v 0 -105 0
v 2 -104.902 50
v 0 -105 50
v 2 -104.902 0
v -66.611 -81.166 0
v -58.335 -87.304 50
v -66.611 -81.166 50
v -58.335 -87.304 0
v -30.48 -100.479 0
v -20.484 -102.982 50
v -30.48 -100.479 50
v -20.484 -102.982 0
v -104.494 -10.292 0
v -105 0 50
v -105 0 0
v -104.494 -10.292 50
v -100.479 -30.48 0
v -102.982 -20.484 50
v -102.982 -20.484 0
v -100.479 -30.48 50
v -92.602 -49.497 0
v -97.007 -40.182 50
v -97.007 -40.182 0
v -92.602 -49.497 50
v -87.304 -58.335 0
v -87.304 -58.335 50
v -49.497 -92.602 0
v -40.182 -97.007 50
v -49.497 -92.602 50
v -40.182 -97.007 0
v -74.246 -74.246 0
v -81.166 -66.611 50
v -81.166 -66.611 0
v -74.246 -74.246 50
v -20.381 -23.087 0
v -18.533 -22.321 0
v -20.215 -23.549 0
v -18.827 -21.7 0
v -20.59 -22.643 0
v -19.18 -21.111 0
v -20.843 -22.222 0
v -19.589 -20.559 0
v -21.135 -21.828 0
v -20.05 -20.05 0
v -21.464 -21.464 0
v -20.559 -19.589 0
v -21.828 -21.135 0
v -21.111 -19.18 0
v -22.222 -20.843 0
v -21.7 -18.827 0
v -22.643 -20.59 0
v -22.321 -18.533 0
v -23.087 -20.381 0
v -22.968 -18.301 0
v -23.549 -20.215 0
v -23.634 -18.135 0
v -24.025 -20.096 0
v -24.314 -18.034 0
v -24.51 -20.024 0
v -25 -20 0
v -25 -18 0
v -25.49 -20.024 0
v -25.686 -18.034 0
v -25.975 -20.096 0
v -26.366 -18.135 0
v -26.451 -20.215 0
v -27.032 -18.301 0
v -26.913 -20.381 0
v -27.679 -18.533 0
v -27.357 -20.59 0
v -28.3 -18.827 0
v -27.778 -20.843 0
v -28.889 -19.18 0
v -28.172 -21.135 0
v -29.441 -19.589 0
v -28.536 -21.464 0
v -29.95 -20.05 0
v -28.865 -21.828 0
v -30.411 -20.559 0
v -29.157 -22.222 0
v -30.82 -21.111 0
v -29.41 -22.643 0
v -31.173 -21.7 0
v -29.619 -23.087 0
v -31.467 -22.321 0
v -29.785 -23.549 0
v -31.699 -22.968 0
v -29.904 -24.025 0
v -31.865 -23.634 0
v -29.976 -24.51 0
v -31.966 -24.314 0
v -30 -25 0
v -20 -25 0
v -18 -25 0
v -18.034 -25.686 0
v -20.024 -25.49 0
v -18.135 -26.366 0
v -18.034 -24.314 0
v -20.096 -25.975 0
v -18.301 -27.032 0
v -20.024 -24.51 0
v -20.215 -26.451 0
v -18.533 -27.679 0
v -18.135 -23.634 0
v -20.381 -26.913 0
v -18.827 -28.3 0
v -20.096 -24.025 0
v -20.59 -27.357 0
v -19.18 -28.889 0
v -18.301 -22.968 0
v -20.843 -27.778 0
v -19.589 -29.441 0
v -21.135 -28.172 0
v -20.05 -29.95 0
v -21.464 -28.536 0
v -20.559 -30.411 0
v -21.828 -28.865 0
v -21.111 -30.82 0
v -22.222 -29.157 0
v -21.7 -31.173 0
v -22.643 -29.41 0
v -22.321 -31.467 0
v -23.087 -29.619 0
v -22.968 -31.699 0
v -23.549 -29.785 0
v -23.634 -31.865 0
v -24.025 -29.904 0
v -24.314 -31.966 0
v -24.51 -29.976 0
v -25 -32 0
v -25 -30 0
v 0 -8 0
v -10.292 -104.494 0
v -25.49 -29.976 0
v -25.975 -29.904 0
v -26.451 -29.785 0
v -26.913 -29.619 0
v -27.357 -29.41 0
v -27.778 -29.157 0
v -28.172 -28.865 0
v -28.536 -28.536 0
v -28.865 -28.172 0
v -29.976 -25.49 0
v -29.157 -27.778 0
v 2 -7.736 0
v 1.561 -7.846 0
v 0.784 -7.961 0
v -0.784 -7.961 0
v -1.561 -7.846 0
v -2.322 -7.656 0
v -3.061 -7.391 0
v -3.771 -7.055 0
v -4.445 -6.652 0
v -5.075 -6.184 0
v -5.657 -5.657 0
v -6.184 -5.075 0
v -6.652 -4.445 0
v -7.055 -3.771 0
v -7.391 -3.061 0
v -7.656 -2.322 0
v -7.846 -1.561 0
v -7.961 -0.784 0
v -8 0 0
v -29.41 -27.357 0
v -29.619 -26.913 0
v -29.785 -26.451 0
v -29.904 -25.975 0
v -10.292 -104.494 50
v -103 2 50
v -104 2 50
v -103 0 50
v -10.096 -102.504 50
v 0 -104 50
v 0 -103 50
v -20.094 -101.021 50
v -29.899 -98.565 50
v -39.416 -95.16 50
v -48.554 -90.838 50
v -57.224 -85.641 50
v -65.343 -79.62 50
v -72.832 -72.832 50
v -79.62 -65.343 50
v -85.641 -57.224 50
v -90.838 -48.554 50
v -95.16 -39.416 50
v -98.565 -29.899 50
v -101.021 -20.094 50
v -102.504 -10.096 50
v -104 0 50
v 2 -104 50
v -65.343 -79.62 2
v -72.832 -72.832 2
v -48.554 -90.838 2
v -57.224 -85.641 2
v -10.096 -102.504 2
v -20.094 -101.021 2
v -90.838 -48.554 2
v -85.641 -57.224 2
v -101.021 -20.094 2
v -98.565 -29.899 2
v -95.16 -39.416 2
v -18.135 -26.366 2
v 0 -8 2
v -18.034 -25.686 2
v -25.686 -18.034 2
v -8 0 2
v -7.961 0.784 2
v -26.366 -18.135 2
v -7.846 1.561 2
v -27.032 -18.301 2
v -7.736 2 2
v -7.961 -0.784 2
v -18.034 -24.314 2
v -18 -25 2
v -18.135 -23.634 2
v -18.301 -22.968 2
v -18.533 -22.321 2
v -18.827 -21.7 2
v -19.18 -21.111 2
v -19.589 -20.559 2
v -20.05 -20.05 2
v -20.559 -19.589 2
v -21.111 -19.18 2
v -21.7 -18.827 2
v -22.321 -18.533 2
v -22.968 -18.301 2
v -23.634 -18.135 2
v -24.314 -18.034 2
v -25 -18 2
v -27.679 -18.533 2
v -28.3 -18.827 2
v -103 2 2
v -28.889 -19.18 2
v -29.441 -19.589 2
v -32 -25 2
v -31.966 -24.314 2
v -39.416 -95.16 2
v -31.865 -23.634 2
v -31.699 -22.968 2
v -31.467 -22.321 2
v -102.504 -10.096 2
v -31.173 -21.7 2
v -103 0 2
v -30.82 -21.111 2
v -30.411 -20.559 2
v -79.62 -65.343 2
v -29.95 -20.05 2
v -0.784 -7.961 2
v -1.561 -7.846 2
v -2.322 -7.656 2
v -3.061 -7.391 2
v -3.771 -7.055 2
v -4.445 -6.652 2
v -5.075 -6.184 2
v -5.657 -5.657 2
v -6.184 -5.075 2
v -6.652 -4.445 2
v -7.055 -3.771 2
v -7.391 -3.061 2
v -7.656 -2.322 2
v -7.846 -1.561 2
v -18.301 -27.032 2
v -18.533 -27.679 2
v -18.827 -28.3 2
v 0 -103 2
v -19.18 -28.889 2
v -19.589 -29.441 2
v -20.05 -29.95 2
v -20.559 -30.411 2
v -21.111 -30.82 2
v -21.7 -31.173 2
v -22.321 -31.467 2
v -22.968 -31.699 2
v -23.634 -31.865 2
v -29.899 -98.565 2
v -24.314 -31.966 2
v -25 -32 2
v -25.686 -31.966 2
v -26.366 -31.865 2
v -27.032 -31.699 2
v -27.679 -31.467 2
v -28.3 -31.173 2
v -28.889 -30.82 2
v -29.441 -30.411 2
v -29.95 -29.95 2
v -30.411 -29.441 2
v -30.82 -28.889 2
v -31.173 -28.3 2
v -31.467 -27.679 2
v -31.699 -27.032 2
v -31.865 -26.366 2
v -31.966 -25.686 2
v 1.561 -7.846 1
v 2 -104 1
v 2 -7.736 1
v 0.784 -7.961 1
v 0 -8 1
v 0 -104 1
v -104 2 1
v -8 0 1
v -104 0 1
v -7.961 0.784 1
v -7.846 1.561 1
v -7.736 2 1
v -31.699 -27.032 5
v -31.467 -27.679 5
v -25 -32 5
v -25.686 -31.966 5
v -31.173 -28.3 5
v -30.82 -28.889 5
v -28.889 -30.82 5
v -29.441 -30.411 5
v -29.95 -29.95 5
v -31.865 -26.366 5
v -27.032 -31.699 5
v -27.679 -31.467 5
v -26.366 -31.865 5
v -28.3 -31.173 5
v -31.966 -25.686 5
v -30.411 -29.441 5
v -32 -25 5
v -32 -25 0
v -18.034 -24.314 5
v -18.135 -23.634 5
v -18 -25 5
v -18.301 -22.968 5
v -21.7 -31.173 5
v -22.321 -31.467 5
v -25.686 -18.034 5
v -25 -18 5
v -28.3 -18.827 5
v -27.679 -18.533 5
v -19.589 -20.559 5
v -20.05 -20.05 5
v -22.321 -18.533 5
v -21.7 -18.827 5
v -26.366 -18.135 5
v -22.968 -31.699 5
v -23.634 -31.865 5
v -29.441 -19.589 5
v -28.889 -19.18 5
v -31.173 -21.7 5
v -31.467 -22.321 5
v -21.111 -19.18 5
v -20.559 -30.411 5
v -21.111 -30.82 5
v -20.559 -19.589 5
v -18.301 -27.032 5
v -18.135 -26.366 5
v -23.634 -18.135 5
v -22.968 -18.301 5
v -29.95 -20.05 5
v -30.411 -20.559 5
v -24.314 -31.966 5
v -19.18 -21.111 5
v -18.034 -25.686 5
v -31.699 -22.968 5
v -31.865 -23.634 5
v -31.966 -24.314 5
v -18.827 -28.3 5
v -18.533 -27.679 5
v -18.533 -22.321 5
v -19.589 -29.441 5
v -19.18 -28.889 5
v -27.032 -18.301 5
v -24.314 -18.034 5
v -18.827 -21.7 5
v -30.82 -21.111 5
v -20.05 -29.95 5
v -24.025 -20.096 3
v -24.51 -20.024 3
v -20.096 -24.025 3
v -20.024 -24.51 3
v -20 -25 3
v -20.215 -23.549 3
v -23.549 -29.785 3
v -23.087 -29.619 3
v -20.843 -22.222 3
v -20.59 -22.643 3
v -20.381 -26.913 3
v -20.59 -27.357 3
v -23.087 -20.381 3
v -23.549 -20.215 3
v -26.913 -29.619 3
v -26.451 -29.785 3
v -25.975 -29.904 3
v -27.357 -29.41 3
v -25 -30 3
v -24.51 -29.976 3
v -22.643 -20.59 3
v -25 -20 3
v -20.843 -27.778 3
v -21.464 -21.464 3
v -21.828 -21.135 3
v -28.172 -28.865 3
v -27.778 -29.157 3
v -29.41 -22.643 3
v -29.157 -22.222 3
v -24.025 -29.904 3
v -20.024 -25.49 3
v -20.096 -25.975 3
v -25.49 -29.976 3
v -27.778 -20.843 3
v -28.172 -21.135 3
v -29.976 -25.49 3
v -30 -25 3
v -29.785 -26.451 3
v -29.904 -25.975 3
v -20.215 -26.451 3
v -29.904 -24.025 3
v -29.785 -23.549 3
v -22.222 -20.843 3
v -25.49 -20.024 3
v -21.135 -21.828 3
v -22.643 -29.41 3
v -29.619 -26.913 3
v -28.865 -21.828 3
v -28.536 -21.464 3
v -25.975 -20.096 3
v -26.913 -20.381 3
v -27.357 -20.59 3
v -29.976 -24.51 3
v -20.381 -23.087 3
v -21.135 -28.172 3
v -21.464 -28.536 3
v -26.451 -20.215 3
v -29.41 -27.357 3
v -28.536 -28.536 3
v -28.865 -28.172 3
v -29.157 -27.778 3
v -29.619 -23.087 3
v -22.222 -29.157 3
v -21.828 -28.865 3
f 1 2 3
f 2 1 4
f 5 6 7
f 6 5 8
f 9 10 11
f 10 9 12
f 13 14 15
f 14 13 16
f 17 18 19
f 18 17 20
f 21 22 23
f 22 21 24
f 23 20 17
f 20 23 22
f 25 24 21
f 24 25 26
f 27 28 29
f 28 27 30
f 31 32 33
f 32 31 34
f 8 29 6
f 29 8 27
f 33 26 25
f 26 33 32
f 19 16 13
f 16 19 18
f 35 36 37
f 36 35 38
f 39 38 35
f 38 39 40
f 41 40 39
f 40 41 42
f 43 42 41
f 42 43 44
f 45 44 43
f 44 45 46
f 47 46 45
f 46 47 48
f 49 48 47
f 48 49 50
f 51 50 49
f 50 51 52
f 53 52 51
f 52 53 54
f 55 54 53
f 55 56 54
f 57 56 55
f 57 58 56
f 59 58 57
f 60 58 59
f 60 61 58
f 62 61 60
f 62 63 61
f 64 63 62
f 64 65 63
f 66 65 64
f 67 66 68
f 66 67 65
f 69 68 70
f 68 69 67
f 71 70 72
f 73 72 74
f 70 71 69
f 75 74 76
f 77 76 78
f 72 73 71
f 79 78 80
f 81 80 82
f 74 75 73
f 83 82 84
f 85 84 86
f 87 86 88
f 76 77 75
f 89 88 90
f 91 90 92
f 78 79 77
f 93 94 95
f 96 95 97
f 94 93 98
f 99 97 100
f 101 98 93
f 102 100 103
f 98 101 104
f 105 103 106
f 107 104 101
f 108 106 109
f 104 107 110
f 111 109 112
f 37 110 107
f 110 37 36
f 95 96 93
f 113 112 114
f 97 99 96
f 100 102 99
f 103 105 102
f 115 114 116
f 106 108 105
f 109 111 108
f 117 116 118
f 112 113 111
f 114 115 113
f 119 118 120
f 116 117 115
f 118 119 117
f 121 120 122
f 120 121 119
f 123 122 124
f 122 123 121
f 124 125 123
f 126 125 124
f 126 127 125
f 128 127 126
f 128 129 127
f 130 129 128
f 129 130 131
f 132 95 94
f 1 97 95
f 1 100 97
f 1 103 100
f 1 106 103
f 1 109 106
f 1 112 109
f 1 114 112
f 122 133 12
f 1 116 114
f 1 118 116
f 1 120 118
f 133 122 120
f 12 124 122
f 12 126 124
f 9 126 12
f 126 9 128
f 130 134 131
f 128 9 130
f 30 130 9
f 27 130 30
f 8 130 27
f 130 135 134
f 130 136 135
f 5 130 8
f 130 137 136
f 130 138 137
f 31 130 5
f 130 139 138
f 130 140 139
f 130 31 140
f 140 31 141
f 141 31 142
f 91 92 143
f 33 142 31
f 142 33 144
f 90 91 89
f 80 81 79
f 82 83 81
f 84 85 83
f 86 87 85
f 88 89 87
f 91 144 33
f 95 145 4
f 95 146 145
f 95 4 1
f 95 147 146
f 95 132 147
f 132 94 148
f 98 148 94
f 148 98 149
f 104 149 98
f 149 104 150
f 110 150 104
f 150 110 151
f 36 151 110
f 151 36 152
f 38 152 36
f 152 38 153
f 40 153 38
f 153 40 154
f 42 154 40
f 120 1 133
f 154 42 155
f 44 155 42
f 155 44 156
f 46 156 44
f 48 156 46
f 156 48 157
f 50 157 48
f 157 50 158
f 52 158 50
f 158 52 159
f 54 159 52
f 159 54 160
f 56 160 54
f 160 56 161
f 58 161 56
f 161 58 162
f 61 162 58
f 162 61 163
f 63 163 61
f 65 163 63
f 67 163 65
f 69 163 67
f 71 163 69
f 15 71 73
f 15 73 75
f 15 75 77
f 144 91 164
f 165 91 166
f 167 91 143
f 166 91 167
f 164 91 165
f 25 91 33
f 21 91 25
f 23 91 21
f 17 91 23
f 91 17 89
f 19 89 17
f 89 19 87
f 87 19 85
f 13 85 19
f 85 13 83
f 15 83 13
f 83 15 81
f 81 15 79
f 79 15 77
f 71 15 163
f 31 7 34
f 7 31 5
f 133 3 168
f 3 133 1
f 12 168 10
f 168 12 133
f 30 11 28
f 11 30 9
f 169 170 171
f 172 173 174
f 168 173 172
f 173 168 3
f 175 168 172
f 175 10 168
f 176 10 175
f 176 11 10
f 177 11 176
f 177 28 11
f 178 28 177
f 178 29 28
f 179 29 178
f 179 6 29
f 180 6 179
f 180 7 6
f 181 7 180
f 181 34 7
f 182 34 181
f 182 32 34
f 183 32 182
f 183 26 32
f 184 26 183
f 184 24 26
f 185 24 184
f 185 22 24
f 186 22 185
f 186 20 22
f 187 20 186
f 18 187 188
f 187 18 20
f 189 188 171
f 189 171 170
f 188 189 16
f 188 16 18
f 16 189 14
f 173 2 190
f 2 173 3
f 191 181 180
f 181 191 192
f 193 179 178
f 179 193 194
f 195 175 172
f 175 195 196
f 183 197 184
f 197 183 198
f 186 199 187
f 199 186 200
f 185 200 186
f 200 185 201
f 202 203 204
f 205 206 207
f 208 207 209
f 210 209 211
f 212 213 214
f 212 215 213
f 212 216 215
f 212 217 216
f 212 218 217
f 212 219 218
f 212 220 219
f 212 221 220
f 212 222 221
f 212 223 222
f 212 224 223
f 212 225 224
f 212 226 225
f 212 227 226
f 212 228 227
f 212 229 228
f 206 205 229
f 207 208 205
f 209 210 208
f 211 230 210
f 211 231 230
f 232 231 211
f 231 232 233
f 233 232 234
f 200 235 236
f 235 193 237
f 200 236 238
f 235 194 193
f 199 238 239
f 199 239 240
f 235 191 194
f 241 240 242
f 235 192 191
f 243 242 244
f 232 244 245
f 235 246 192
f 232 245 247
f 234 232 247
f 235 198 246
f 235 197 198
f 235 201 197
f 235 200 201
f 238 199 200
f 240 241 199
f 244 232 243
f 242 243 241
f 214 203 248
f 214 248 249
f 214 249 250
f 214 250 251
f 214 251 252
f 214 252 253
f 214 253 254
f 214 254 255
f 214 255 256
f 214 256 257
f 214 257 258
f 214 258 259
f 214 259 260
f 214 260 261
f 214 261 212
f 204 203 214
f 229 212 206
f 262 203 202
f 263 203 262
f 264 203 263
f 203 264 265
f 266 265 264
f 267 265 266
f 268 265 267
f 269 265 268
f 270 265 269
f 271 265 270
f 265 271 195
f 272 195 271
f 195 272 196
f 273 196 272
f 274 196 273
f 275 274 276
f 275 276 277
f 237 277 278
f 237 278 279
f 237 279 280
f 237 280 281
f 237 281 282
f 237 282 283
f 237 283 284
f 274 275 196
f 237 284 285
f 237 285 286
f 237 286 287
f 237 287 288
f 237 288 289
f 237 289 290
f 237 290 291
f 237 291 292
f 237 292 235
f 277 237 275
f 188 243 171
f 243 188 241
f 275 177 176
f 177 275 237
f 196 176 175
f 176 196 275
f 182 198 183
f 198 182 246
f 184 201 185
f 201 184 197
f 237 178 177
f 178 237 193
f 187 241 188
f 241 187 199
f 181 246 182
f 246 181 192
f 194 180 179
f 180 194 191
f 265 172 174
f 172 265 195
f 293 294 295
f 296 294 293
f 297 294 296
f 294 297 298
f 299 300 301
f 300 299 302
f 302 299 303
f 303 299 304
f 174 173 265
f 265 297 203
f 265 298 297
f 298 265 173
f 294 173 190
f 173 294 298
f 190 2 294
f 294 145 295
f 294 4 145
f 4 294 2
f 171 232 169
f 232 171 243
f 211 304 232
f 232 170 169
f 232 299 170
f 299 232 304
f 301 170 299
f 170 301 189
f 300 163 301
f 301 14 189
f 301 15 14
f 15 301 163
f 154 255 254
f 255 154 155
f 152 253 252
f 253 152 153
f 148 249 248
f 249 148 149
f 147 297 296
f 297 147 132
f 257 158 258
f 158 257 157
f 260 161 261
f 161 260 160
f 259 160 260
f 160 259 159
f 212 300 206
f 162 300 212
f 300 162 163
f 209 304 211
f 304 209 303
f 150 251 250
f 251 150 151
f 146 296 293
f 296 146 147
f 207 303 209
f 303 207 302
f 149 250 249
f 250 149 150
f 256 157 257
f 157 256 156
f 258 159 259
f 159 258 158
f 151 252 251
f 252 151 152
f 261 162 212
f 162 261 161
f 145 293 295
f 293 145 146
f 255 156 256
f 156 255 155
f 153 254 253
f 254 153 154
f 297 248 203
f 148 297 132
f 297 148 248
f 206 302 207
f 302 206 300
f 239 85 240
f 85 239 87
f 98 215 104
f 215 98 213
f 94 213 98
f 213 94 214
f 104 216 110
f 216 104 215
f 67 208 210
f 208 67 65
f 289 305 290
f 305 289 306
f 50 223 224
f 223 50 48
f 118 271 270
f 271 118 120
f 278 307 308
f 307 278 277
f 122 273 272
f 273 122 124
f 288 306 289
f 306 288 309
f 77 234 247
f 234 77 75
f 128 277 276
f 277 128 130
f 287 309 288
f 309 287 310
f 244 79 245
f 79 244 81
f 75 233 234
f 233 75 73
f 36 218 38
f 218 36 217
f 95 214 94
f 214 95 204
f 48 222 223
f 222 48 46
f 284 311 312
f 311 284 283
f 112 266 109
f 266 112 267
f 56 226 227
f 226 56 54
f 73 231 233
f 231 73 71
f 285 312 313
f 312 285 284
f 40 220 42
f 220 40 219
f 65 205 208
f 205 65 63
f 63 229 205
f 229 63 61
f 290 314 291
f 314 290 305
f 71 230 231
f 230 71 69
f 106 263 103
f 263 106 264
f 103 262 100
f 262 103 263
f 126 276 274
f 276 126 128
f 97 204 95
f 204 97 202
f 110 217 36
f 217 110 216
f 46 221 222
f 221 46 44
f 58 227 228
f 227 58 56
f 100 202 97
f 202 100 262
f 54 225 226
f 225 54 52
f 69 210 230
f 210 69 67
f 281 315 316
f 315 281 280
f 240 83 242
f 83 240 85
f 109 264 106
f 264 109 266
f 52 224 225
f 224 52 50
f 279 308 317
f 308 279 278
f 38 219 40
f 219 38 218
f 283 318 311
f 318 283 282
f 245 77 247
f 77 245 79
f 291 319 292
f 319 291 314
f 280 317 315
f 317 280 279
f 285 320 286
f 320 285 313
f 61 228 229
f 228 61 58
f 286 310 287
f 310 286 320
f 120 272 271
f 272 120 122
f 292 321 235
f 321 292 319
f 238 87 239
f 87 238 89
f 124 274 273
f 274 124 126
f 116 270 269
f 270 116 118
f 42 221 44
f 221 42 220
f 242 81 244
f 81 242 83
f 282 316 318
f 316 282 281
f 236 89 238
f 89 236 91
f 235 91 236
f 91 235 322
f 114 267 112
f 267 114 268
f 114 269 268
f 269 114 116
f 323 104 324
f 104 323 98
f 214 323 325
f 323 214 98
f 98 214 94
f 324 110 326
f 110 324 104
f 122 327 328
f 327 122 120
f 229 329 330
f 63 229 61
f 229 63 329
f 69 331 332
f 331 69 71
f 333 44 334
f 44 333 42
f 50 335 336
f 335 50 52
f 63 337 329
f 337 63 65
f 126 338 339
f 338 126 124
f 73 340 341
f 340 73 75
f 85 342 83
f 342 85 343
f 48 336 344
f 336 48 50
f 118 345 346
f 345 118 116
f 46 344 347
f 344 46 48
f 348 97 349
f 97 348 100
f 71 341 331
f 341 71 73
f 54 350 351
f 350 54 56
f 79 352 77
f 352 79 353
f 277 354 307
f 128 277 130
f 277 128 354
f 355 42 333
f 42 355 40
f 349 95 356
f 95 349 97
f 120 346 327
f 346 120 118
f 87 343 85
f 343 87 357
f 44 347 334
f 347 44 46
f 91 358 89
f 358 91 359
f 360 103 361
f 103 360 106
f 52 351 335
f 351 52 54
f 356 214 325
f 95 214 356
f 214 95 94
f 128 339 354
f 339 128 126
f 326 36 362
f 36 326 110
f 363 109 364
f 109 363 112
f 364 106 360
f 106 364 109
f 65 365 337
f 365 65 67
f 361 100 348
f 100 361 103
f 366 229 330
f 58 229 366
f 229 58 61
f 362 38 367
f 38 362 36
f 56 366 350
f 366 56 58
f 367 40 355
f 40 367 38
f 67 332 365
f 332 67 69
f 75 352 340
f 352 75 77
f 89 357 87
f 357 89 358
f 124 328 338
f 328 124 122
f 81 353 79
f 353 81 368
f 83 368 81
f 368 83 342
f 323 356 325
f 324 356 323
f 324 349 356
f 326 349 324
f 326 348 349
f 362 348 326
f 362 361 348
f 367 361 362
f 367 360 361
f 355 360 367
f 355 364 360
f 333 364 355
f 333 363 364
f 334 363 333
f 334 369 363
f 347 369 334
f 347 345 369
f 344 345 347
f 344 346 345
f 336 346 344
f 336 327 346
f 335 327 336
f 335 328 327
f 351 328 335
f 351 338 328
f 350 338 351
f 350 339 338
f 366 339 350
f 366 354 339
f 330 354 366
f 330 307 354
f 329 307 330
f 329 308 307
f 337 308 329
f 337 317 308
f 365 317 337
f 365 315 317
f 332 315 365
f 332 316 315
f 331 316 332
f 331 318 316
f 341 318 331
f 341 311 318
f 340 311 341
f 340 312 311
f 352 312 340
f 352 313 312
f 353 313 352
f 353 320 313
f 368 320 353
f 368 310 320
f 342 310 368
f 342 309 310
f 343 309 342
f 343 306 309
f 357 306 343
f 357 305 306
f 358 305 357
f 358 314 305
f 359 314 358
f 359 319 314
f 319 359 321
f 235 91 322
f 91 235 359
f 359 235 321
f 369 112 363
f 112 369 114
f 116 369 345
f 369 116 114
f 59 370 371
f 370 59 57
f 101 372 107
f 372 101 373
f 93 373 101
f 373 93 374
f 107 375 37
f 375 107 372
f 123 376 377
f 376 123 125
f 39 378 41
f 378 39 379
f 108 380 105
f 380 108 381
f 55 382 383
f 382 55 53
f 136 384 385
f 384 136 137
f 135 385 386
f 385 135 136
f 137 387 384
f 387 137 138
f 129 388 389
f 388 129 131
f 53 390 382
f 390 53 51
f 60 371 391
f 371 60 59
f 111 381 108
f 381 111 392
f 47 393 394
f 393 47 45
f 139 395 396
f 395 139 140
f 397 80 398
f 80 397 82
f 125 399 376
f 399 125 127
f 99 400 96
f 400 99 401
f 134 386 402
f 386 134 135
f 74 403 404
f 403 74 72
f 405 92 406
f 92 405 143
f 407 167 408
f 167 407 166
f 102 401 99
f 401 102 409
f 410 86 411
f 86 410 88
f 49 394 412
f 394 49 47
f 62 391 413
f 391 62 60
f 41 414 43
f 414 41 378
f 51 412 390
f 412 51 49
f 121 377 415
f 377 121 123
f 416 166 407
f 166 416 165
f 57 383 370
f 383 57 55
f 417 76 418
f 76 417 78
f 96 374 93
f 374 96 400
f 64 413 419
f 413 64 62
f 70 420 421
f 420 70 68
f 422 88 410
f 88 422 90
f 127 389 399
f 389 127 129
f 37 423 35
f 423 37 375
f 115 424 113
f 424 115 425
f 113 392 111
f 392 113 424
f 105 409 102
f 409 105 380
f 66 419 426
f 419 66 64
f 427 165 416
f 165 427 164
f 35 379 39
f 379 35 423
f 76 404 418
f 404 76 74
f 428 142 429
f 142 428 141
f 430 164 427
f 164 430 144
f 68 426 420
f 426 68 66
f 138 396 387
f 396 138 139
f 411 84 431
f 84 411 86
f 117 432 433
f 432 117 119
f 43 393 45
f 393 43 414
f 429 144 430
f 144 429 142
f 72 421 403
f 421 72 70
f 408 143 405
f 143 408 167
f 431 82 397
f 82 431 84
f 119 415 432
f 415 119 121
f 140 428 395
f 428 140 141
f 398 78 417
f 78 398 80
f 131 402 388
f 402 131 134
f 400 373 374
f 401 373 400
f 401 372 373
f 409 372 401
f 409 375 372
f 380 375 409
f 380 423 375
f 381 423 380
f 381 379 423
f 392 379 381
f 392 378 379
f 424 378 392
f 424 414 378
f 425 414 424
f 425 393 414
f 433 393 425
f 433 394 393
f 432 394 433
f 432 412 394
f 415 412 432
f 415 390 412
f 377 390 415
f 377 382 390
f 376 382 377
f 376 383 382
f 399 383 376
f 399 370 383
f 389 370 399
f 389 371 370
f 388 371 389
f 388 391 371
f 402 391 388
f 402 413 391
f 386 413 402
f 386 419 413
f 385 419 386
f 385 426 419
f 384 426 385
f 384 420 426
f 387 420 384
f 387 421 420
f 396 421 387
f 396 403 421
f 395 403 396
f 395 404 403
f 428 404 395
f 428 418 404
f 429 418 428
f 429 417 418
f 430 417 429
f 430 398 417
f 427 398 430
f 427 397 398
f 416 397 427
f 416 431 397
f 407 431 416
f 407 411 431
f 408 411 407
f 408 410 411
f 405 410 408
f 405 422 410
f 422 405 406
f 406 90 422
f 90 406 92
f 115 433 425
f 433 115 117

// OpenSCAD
Diameter = 210;
TrackWidth = 50;
Thickness = 2;

HasMagnet = true;
MagnetDiameter = 10;
MagnetHeight = 3;

module magnetMount(position) {
    if (HasMagnet) {
        $fn = 64;
        innerRadius = MagnetDiameter / 2;
        outerRadius = innerRadius + Thickness;
        innerHeight = MagnetHeight;
        outerHeight = innerHeight + Thickness;
        
        translate([position, position, 0]) {
            difference() {
                cylinder(outerHeight, outerRadius, outerRadius);
                translate([0, 0, - Thickness]) {
                    cylinder(innerHeight + Thickness, innerRadius, innerRadius);
                }
            }
        }
    }
}

module wheel() {
    $fa = 1;
    diameter = max(Diameter, 210); // minimum recommended diameter for dwarf hamsters
    trackWidth = max(TrackWidth, 50); 
    outerRadius = diameter / 2;
    innerRadius = outerRadius - Thickness;    
    magnetPosition = - 25;
    
    difference() {
        halfThickness = Thickness / 2;
        cylinder(trackWidth, outerRadius, outerRadius);
        translate([0, 0, Thickness]) {
            cylinder(trackWidth, innerRadius, innerRadius);
        }
        translate([0, - outerRadius + halfThickness, halfThickness]) {
            cube([diameter, diameter * 2, trackWidth * 2]);
        }
        translate([Thickness, - diameter, - halfThickness]) {
            cube([diameter, diameter * 2, trackWidth * 2]);
        }
        translate([- outerRadius + Thickness, 0, Thickness]) {
            cube([diameter * 2, diameter, trackWidth * 2]);
        }
        translate([- diameter, Thickness, - Thickness]) {
            cube([diameter * 2, diameter, trackWidth * 2]);
        }
        translate([- diameter + halfThickness, 0, - Thickness]) {
            cube([outerRadius, outerRadius, trackWidth * 2]);
        }
        translate([- Diameter, 0, - (TrackWidth *  2) + halfThickness]) {
            cube([diameter * 2, diameter, trackWidth * 2]);
        }
        
        {
            $fn = 64;
            cylinder(10, 8, 8, center = true);
        }

        if (HasMagnet) {
            translate([magnetPosition, magnetPosition, - MagnetHeight]) {
                h = (MagnetHeight + Thickness)* 2;
                r = (MagnetDiameter / 2) + Thickness;
                cylinder(h, r, r);
            }
        }
    }

    magnetMount(magnetPosition);
}

wheel();
